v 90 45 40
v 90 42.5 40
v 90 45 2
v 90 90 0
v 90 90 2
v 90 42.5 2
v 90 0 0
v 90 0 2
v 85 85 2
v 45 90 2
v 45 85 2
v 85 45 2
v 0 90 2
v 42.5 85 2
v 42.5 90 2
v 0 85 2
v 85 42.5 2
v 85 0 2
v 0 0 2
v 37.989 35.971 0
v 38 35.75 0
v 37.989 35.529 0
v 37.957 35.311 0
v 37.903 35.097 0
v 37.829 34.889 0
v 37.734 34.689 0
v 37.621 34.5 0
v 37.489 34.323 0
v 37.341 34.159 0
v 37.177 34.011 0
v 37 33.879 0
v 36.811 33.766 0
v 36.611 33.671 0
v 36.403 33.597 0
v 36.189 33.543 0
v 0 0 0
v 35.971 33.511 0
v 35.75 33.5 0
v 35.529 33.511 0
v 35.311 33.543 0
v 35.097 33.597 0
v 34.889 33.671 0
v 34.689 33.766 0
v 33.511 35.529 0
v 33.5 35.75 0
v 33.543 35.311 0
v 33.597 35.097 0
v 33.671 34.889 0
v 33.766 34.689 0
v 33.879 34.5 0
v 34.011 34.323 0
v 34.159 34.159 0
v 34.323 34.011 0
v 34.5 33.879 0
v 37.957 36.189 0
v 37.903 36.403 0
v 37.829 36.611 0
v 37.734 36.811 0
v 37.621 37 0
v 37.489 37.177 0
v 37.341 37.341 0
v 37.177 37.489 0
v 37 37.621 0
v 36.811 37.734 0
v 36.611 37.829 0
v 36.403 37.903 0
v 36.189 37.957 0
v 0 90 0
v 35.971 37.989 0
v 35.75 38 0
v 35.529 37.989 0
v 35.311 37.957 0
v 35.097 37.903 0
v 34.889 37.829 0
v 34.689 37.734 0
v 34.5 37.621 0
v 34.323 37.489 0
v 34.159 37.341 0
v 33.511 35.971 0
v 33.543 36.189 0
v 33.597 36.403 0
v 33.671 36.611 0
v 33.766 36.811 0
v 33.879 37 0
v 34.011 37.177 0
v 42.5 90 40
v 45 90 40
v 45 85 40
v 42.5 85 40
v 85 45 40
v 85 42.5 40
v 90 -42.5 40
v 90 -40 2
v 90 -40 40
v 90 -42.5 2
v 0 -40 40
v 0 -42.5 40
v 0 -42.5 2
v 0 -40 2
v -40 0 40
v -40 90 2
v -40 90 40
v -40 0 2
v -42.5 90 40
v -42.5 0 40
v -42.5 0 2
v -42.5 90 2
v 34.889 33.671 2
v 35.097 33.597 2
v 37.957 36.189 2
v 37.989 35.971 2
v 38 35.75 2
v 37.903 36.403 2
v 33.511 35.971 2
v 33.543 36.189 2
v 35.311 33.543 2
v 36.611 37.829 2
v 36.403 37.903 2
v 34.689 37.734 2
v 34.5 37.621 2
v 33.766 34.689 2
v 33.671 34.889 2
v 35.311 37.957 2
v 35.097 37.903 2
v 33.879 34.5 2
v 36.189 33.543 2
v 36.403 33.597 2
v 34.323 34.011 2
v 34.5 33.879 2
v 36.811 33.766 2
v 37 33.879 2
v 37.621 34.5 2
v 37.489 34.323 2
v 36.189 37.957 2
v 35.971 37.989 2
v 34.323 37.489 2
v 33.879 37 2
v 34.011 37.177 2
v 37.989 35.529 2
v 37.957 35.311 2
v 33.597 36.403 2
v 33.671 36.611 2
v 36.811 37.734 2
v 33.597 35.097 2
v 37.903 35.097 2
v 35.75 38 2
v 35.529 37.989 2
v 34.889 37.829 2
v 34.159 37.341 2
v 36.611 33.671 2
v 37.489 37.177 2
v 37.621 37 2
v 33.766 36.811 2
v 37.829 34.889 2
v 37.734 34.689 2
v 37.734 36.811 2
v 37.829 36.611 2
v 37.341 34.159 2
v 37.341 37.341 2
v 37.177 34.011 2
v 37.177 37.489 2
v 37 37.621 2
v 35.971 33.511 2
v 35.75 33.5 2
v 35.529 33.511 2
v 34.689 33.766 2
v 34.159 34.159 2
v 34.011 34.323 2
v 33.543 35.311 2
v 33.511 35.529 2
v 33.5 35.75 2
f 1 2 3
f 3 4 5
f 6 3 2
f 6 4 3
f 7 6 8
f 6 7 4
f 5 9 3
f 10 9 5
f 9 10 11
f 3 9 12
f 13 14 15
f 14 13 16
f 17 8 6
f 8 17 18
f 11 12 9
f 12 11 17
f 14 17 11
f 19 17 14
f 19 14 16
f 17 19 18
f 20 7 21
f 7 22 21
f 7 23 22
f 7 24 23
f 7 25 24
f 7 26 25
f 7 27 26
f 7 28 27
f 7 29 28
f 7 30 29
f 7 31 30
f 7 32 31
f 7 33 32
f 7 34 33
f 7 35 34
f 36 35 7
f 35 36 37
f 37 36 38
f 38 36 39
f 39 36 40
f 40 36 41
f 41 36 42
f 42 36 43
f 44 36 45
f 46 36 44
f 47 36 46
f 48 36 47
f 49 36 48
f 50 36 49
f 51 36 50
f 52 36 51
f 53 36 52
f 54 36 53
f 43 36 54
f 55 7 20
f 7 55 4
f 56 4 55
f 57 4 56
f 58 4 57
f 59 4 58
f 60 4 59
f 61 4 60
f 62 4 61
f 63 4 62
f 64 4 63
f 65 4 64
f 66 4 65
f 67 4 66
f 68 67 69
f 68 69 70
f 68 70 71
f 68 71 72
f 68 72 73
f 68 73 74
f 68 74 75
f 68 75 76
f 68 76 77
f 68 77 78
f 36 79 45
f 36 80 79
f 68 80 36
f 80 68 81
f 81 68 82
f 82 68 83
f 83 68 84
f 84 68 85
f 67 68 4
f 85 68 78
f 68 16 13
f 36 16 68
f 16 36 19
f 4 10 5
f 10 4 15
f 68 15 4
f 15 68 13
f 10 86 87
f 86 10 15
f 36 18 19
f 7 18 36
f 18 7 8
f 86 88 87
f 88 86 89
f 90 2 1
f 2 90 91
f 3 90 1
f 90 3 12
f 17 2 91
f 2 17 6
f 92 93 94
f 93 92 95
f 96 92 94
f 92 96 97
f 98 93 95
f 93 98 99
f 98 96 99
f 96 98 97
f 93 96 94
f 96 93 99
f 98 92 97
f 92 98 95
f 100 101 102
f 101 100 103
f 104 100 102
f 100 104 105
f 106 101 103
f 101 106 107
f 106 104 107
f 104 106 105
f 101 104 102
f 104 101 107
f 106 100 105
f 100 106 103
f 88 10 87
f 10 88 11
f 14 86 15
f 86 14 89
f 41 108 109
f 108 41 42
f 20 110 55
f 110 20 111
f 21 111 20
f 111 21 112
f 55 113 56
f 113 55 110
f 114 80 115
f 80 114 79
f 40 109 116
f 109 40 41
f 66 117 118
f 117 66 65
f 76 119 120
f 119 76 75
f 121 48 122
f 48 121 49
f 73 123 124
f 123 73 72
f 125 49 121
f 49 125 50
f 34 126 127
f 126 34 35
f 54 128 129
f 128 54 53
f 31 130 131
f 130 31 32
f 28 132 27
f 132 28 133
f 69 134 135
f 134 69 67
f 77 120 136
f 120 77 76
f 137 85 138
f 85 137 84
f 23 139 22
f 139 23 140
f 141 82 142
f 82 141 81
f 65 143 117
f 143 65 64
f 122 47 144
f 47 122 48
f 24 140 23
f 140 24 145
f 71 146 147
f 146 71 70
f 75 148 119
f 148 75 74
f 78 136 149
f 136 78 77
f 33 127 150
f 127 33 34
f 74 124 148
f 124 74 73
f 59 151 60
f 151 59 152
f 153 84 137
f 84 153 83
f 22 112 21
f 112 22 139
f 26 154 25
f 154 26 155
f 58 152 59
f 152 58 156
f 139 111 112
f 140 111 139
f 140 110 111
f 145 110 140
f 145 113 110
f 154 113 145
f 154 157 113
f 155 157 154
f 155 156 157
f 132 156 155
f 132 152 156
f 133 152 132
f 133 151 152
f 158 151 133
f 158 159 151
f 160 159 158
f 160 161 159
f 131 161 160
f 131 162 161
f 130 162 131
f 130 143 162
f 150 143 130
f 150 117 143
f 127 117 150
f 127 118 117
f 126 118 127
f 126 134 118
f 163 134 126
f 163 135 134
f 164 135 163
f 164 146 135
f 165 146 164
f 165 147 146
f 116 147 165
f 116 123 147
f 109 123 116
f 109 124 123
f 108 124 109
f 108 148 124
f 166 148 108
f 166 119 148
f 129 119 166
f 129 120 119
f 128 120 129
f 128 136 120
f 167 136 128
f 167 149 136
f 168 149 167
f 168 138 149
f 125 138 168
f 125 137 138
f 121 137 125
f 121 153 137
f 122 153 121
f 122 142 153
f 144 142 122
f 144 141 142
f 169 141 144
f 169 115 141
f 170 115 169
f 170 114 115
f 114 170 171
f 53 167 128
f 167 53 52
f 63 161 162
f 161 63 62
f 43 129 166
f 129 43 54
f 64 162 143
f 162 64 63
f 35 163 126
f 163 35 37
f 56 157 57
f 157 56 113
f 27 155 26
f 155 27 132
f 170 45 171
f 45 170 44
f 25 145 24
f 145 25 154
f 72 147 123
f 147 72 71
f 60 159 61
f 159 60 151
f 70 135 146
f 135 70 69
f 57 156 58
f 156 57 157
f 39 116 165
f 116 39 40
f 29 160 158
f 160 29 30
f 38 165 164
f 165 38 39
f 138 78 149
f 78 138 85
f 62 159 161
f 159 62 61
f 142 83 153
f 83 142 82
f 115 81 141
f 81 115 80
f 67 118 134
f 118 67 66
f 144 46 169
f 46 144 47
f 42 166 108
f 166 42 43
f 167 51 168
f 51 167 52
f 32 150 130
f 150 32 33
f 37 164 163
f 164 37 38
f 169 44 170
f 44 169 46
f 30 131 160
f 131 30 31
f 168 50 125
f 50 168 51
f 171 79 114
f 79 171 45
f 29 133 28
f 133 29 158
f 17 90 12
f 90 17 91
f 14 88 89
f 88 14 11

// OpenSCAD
// === Dimensions ===
// Top plate thickness
top_plate_z = 2;
// Wall thickness
wall_thick = 2.5;
// Wall height (from top of top plate)
wall_height = 40 - top_plate_z;
// Outer width (X)
outer_x = 90;
// Outer depth (Y)
outer_y = 90;
// Screw hole diameter
screw_dia = 4.5;
// Screw hole pattern spacing (square)
screw_pattern = 71.5;
// Cable notch width
notch_width = 12;
// Cable notch depth from top of wall
notch_depth = 8;

// === Derived ===
// Inner width
inner_x = outer_x - 2 * wall_thick;
// Inner depth
inner_y = outer_y - 2 * wall_thick;
// Half dimensions
half_x = outer_x / 2;
half_y = outer_y / 2;
// Half screw pattern
half_pattern = screw_pattern / 2;

// === Build ===
$fn = 64;

// Main box: top plate + 4 walls
difference() {
    // Outer shape (top plate + walls)
    union() {
        // Top plate
        cube([outer_x, outer_y, top_plate_z], center = false);
        // Four walls
        // Front wall (Y+ side)
        translate([0, half_y - wall_thick, top_plate_z])
            cube([outer_x, wall_thick, wall_height], center = false);
        // Back wall (Y- side)
        translate([0, -half_y + wall_thick, top_plate_z])
            cube([outer_x, wall_thick, wall_height], center = false);
        // Left wall (X- side)
        translate([-half_x + wall_thick, 0, top_plate_z])
            cube([wall_thick, outer_y, wall_height], center = false);
        // Right wall (X+ side)
        translate([half_x - wall_thick, 0, top_plate_z])
            cube([wall_thick, outer_y, wall_height], center = false);
    }
    
    // Cut out inner cavity
    translate([0, 0, top_plate_z])
        cube([inner_x, inner_y, wall_height + 0.01], center = false);
    
    // Four screw holes
    for (x = [-half_pattern, half_pattern]) {
        for (y = [-half_pattern, half_pattern]) {
            translate([x, y, -0.01])
                cylinder(d = screw_dia, h = top_plate_z + 0.01, center = false);
        }
    }
    
    // Cable notch in the front wall (Y+ side)
    // Notch is 12mm wide, centered along X, from z=32 to z=40
    translate([0, half_y - 0.01, 32])
        cube([notch_width, wall_thick + 0.02, notch_depth], center = false);
}
